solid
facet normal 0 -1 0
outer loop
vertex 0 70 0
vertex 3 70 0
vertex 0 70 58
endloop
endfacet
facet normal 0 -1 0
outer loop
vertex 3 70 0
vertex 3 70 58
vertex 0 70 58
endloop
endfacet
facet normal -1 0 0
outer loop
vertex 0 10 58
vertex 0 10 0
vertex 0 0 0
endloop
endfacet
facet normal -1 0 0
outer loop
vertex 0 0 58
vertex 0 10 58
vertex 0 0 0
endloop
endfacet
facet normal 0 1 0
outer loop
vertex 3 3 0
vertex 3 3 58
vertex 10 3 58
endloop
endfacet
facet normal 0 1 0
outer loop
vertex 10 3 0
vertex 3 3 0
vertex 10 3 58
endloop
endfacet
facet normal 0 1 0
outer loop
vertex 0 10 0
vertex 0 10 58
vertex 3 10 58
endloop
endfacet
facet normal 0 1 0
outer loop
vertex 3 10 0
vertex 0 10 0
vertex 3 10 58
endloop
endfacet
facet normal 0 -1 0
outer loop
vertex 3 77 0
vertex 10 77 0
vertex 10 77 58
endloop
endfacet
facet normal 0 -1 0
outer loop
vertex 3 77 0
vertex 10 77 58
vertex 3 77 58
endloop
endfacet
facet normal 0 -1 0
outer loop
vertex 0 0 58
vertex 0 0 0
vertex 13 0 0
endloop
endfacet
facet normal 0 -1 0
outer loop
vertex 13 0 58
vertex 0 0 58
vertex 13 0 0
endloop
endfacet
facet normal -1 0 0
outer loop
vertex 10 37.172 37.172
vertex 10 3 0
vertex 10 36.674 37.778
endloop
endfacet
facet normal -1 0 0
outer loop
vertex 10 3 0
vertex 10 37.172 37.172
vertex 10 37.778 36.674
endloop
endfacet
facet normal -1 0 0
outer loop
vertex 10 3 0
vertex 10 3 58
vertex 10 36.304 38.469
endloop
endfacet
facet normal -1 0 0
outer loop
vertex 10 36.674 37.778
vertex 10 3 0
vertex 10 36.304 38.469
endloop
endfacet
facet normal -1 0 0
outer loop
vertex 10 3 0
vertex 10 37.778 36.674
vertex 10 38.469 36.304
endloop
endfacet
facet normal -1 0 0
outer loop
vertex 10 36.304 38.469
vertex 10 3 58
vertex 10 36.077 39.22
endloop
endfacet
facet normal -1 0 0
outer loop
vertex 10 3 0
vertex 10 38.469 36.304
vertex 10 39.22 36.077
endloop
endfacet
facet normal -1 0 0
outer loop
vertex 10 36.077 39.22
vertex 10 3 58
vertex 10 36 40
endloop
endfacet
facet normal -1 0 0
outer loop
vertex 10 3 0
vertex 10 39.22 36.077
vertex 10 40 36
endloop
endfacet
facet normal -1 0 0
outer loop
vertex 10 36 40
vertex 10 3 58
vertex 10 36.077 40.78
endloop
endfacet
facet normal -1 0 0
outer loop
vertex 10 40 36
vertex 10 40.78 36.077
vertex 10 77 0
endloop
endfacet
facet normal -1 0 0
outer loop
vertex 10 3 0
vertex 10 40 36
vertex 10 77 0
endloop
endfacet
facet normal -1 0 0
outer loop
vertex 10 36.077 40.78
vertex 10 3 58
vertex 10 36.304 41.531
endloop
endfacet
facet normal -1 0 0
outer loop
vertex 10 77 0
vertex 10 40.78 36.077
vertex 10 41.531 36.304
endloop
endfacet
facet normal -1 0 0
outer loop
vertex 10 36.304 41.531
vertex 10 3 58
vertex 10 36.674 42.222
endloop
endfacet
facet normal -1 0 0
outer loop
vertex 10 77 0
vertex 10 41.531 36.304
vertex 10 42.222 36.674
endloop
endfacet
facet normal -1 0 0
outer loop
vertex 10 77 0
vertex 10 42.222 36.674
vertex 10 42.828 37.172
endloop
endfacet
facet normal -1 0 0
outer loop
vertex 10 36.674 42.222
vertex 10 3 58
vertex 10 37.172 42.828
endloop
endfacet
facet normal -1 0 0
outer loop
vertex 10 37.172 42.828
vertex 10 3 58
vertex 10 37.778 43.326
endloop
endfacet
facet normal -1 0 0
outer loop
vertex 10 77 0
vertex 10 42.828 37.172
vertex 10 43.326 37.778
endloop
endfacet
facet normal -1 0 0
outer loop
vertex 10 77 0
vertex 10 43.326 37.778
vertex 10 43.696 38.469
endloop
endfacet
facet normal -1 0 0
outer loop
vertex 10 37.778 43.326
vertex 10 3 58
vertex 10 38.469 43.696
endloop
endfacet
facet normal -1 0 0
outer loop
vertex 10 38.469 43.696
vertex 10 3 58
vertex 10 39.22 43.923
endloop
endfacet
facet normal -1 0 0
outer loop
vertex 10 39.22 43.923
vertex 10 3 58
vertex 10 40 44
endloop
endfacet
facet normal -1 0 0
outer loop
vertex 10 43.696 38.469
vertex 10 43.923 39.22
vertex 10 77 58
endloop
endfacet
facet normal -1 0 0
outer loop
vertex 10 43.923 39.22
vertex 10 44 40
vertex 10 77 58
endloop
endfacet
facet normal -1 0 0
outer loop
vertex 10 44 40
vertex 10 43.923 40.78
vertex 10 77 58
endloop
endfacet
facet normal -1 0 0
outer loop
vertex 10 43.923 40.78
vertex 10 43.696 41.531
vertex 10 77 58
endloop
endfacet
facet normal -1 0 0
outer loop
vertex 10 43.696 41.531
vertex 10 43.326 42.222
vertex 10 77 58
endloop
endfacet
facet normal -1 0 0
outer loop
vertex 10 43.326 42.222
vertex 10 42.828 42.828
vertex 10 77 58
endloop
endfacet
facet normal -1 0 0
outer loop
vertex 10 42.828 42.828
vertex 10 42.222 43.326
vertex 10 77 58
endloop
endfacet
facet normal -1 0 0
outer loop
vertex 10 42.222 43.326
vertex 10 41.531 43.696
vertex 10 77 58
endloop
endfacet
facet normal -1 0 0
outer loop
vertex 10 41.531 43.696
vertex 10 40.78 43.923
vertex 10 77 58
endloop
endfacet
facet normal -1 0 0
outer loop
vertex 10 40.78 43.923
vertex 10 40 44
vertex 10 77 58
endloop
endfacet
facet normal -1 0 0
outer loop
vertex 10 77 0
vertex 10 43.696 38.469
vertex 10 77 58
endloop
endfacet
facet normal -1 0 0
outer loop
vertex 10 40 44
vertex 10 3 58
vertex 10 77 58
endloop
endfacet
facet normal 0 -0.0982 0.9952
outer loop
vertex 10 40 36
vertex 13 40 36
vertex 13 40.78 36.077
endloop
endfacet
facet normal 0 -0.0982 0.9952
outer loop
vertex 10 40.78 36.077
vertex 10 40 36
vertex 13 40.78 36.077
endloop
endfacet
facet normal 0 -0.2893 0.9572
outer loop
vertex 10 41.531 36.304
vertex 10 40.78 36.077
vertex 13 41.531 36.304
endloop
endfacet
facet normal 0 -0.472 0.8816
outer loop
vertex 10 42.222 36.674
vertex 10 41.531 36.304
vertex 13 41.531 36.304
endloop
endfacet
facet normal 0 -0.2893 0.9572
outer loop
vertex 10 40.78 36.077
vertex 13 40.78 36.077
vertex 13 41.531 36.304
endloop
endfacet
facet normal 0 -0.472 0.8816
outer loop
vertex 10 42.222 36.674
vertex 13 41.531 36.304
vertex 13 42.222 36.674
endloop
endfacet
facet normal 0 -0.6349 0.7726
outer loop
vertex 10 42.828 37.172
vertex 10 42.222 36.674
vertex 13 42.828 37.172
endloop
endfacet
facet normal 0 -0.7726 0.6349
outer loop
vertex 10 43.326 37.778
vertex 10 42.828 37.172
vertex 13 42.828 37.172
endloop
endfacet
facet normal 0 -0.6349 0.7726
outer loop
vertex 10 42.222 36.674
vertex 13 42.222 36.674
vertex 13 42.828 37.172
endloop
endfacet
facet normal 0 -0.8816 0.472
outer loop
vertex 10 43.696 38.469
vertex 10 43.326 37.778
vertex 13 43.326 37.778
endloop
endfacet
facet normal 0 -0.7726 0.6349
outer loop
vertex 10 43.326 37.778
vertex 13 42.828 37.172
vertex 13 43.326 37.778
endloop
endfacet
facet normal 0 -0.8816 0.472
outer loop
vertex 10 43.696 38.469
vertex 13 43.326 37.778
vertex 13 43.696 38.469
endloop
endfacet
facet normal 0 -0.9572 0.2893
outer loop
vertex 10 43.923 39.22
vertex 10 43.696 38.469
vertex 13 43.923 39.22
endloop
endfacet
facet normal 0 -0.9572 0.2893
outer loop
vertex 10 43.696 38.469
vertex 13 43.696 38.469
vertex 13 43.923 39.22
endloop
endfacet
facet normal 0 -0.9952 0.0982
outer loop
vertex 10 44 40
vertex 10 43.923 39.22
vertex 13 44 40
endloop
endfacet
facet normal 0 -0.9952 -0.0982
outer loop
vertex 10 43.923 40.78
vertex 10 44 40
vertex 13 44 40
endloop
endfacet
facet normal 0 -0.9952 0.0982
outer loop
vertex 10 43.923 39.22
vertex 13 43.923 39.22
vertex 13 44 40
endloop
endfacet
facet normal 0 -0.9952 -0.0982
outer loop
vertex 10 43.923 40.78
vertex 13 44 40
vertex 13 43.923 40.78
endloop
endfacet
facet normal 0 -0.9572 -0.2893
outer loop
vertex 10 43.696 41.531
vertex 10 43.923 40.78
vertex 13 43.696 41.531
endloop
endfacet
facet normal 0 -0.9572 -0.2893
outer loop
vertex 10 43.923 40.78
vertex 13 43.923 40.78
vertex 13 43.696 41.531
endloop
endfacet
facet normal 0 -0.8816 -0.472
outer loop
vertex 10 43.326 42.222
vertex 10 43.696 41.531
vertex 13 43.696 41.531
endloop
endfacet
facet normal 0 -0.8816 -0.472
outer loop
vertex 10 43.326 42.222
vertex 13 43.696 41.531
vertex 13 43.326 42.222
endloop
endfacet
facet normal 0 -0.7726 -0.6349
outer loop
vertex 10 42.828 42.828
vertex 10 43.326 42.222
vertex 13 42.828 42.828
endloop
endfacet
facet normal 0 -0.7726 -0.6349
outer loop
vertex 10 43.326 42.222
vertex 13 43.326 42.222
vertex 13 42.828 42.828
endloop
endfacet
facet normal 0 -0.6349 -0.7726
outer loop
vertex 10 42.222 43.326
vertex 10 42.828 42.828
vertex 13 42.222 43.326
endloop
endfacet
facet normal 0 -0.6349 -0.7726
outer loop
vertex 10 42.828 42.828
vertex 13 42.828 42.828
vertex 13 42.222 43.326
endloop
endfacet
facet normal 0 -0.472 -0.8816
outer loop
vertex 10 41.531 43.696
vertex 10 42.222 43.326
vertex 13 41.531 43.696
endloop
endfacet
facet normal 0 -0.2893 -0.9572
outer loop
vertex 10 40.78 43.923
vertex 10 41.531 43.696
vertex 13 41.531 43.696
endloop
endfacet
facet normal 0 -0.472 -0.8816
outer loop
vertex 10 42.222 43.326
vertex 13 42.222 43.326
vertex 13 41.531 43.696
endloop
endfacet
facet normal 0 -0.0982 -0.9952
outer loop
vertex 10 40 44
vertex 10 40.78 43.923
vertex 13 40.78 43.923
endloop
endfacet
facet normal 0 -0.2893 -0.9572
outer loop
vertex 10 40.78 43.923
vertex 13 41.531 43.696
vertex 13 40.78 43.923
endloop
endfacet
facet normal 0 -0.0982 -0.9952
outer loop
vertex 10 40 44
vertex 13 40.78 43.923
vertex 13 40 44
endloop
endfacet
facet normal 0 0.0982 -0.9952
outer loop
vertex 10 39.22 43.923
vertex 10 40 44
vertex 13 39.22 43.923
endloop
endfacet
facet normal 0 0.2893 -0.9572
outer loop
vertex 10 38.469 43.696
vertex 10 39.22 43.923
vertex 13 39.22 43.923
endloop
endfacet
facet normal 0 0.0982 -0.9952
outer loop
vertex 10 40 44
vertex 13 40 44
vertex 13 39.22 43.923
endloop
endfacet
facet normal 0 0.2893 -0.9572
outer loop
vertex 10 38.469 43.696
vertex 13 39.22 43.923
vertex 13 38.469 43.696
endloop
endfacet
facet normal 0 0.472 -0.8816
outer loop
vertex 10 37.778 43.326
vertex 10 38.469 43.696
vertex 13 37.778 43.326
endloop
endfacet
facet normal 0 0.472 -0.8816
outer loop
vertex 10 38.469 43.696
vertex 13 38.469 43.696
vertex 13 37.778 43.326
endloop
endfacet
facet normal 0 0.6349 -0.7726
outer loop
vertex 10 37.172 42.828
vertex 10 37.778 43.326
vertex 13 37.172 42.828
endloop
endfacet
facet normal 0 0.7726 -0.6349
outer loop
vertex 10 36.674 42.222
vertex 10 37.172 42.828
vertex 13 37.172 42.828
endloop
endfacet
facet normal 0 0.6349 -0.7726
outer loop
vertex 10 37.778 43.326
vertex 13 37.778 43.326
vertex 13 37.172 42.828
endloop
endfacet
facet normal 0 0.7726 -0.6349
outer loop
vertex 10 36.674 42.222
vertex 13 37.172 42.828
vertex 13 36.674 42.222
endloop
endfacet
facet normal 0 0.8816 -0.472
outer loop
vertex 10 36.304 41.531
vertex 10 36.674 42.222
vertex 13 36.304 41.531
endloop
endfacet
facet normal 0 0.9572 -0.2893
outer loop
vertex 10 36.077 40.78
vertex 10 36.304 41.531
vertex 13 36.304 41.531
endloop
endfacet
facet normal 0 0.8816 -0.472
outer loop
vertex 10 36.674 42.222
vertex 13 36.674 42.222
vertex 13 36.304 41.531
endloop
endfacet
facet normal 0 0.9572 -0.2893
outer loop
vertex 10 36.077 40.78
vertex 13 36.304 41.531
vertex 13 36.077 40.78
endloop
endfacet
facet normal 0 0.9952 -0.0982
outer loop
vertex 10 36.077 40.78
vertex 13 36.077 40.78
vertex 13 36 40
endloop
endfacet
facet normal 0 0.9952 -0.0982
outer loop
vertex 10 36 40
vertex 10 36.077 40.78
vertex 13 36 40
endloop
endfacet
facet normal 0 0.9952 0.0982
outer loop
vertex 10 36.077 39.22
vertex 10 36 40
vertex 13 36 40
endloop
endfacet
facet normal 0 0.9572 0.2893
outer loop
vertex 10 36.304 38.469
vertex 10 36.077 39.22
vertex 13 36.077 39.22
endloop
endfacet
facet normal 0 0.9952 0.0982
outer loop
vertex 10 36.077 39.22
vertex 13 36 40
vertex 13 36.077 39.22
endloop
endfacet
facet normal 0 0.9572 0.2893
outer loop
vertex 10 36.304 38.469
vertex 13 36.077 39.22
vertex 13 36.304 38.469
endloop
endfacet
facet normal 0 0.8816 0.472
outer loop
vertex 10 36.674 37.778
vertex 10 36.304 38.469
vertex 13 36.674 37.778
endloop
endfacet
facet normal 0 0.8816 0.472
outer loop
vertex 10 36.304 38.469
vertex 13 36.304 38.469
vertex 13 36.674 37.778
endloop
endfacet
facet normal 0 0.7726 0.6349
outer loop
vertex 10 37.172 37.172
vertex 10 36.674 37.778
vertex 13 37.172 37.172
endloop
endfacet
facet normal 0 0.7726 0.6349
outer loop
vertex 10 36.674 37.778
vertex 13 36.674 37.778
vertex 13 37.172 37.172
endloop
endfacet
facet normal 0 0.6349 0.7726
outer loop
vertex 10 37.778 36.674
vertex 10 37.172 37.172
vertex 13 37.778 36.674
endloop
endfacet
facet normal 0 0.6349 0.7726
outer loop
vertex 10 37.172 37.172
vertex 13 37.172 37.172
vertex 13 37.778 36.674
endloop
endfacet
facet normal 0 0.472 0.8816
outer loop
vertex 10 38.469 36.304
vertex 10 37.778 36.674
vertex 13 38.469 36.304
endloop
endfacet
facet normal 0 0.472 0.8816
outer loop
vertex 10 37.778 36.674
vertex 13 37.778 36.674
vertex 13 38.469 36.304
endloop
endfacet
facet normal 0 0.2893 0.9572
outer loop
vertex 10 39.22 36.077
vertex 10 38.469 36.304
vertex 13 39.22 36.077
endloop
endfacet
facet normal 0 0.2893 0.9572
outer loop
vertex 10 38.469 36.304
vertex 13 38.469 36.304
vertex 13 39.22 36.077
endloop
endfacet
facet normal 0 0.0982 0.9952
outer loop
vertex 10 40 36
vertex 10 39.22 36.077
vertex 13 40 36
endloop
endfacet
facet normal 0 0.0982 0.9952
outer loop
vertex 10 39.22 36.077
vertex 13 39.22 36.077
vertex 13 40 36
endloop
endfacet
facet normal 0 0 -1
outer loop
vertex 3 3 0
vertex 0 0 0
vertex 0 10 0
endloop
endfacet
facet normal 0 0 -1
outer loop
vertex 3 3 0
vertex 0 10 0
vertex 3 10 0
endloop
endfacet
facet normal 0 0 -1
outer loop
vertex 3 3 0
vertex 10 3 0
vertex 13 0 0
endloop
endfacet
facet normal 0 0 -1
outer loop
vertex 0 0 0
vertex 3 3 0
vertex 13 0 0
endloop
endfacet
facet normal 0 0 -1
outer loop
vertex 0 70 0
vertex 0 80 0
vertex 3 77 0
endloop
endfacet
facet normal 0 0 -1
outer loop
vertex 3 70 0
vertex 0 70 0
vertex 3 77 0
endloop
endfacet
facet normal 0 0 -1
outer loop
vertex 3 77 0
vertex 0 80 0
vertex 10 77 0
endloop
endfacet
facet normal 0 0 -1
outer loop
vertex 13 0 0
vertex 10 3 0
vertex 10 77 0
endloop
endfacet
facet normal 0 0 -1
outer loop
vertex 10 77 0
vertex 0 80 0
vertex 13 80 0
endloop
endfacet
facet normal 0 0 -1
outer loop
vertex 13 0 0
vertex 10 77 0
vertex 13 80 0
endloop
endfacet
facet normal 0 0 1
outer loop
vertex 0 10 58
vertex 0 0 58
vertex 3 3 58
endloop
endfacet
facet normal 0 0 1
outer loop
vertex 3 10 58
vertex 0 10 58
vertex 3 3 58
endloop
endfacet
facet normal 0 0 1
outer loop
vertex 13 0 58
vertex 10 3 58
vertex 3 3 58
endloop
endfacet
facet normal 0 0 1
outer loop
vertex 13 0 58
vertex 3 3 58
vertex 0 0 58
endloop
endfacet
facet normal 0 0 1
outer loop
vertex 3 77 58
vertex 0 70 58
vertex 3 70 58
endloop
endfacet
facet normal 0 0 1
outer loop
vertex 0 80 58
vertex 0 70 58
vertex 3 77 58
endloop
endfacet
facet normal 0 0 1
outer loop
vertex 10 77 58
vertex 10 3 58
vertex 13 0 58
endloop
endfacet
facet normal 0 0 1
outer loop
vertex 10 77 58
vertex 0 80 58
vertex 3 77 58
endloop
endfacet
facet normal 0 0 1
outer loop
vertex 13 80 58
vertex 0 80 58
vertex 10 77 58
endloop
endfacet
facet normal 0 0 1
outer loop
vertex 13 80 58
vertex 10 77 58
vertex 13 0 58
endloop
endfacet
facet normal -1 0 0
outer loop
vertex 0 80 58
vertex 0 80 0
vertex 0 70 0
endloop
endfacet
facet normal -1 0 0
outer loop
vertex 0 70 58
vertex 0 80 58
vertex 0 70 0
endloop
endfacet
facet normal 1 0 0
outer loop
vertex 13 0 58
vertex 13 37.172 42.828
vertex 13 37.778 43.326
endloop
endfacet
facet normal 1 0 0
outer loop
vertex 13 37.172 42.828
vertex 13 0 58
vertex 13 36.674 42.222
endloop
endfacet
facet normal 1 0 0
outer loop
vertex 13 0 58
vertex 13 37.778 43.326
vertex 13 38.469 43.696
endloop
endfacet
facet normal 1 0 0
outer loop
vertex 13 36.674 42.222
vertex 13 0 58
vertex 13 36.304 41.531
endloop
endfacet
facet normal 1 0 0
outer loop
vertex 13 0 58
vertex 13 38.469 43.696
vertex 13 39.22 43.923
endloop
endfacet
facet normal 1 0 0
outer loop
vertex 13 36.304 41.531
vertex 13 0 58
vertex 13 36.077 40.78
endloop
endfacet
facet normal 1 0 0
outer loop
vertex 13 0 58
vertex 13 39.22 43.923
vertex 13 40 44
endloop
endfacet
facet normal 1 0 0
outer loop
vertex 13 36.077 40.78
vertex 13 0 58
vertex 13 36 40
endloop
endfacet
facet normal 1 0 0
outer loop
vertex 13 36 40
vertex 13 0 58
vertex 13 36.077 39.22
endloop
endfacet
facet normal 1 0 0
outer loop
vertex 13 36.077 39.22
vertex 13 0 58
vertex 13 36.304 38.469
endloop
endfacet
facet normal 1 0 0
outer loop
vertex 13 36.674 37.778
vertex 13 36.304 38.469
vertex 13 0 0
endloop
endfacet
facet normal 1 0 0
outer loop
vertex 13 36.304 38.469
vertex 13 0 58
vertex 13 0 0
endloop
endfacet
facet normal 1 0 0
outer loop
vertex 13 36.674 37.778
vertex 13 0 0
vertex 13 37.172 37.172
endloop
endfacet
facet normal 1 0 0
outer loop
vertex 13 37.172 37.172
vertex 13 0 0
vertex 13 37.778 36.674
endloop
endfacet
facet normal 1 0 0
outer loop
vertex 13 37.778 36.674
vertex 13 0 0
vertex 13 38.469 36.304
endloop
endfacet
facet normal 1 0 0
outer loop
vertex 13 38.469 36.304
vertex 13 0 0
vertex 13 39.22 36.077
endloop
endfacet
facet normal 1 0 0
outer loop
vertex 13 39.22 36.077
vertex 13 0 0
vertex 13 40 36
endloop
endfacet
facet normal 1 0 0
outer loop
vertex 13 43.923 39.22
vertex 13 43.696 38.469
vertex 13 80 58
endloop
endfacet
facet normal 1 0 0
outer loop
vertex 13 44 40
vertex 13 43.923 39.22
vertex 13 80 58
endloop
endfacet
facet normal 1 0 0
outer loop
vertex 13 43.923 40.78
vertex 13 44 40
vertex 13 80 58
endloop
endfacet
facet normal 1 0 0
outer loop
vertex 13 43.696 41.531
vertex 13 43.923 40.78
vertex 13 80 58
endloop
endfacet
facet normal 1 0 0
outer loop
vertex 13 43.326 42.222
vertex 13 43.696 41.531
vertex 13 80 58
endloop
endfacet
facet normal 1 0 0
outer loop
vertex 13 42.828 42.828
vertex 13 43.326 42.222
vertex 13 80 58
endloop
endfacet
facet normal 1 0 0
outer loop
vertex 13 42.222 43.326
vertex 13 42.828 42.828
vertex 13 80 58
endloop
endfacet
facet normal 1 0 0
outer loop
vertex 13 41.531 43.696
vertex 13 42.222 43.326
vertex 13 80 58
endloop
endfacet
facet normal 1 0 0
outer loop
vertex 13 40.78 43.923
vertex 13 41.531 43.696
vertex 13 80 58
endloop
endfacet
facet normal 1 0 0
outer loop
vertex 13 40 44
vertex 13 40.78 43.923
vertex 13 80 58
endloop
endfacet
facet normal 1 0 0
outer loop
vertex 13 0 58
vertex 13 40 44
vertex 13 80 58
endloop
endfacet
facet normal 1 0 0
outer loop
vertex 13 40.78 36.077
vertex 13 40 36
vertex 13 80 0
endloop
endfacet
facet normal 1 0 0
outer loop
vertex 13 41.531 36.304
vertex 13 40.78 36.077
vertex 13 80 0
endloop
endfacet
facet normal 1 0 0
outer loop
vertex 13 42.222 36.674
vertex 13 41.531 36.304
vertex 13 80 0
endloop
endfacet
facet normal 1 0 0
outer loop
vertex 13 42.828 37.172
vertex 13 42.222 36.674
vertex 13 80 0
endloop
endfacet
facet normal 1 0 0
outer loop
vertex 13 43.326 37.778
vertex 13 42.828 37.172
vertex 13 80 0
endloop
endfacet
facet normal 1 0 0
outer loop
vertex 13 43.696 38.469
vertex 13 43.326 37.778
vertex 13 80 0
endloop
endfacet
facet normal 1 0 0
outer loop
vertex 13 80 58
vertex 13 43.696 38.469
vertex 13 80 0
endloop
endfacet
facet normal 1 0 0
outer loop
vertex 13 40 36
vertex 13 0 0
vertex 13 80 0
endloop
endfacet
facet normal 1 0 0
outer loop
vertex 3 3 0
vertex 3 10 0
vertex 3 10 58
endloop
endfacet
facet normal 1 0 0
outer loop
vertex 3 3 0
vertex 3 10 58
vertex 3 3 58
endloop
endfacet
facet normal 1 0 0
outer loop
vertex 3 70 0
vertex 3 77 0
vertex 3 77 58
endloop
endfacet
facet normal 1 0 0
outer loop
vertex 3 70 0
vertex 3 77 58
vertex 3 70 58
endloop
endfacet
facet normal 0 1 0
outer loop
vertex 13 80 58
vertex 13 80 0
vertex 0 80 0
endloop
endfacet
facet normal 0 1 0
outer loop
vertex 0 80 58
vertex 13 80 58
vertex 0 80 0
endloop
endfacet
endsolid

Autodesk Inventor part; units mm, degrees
ref_plane "YZ Plane" through (0, 0, 0) normal (1, 0, 0) x (0, 1, 0)
ref_plane "XZ Plane" through (0, 0, 0) normal (0, 1, 0) x (-1, 0, 0)
ref_plane "XY Plane" through (0, 0, 0) normal (0, 0, 1) x (1, 0, 0)
sketch "Sketch1" plane through (0, 0, 0) normal (0, 0, 1) x (1, 0, 0)
  line L0 (0, 0) -> (13, 0)
  line L1 (13, 0) -> (13, 80)
  line L2 (13, 80) -> (0, 80)
  line L3 (0, 80) -> (0, 0)
  dimension "d0" = 80
  dimension "d1" = 13
extrude "Extrusion1" add sketch "Sketch1" along normal blind 58
sketch "Sketch2" plane through (0, 0, 58) normal (0, 0, 1) x (1, 0, 0)
  line L0 (10, 77) -> (3, 77)
  line L1 (3, 3) -> (10, 3)
  line L2 (10, 3) -> (10, 77)
  line L3 (13, 0) -> (13, 80) projected
  line L4 (13, 80) -> (0, 80) projected
  line L5 (0, 0) -> (13, 0) projected
  line L6 (0, 80) -> (0, 0) projected
  line L7 (0, 10) -> (3, 10)
  line L8 (3, 70) -> (0, 70)
  line L9 (0, 70) -> (0, 10)
  line L10 (3, 77) -> (3, 70)
  line L11 (3, 10) -> (3, 3)
  point P0 (0, 70)
  dimension "d4" = 3
  dimension "d5" = 3
  dimension "d6" = 3
  dimension "d8" = 10
  dimension "d9" = 10
extrude "Extrusion2" cut sketch "Sketch2" against normal through all contours L2 L1 L11 L7 L6 L8 L10 L0
sketch "Sketch3" plane through (13, 0, 0) normal (1, 0, 0) x (0, 0, -1)
  circle A0 centre (-40, 40) radius 4
  line L0 (-58, 0) -> (-58, 80) projected
  line L1 (0, 0) -> (-58, 0) projected
  line L2 (0, 0) -> (0, 80) projected
  dimension "d12" = 8
  dimension "d14" = 40
  dimension "d17" = 40
extrude "Extrusion3" cut sketch "Sketch3" against normal through all
properties part number "servo_mount" material "PC/ABS Plastic"
